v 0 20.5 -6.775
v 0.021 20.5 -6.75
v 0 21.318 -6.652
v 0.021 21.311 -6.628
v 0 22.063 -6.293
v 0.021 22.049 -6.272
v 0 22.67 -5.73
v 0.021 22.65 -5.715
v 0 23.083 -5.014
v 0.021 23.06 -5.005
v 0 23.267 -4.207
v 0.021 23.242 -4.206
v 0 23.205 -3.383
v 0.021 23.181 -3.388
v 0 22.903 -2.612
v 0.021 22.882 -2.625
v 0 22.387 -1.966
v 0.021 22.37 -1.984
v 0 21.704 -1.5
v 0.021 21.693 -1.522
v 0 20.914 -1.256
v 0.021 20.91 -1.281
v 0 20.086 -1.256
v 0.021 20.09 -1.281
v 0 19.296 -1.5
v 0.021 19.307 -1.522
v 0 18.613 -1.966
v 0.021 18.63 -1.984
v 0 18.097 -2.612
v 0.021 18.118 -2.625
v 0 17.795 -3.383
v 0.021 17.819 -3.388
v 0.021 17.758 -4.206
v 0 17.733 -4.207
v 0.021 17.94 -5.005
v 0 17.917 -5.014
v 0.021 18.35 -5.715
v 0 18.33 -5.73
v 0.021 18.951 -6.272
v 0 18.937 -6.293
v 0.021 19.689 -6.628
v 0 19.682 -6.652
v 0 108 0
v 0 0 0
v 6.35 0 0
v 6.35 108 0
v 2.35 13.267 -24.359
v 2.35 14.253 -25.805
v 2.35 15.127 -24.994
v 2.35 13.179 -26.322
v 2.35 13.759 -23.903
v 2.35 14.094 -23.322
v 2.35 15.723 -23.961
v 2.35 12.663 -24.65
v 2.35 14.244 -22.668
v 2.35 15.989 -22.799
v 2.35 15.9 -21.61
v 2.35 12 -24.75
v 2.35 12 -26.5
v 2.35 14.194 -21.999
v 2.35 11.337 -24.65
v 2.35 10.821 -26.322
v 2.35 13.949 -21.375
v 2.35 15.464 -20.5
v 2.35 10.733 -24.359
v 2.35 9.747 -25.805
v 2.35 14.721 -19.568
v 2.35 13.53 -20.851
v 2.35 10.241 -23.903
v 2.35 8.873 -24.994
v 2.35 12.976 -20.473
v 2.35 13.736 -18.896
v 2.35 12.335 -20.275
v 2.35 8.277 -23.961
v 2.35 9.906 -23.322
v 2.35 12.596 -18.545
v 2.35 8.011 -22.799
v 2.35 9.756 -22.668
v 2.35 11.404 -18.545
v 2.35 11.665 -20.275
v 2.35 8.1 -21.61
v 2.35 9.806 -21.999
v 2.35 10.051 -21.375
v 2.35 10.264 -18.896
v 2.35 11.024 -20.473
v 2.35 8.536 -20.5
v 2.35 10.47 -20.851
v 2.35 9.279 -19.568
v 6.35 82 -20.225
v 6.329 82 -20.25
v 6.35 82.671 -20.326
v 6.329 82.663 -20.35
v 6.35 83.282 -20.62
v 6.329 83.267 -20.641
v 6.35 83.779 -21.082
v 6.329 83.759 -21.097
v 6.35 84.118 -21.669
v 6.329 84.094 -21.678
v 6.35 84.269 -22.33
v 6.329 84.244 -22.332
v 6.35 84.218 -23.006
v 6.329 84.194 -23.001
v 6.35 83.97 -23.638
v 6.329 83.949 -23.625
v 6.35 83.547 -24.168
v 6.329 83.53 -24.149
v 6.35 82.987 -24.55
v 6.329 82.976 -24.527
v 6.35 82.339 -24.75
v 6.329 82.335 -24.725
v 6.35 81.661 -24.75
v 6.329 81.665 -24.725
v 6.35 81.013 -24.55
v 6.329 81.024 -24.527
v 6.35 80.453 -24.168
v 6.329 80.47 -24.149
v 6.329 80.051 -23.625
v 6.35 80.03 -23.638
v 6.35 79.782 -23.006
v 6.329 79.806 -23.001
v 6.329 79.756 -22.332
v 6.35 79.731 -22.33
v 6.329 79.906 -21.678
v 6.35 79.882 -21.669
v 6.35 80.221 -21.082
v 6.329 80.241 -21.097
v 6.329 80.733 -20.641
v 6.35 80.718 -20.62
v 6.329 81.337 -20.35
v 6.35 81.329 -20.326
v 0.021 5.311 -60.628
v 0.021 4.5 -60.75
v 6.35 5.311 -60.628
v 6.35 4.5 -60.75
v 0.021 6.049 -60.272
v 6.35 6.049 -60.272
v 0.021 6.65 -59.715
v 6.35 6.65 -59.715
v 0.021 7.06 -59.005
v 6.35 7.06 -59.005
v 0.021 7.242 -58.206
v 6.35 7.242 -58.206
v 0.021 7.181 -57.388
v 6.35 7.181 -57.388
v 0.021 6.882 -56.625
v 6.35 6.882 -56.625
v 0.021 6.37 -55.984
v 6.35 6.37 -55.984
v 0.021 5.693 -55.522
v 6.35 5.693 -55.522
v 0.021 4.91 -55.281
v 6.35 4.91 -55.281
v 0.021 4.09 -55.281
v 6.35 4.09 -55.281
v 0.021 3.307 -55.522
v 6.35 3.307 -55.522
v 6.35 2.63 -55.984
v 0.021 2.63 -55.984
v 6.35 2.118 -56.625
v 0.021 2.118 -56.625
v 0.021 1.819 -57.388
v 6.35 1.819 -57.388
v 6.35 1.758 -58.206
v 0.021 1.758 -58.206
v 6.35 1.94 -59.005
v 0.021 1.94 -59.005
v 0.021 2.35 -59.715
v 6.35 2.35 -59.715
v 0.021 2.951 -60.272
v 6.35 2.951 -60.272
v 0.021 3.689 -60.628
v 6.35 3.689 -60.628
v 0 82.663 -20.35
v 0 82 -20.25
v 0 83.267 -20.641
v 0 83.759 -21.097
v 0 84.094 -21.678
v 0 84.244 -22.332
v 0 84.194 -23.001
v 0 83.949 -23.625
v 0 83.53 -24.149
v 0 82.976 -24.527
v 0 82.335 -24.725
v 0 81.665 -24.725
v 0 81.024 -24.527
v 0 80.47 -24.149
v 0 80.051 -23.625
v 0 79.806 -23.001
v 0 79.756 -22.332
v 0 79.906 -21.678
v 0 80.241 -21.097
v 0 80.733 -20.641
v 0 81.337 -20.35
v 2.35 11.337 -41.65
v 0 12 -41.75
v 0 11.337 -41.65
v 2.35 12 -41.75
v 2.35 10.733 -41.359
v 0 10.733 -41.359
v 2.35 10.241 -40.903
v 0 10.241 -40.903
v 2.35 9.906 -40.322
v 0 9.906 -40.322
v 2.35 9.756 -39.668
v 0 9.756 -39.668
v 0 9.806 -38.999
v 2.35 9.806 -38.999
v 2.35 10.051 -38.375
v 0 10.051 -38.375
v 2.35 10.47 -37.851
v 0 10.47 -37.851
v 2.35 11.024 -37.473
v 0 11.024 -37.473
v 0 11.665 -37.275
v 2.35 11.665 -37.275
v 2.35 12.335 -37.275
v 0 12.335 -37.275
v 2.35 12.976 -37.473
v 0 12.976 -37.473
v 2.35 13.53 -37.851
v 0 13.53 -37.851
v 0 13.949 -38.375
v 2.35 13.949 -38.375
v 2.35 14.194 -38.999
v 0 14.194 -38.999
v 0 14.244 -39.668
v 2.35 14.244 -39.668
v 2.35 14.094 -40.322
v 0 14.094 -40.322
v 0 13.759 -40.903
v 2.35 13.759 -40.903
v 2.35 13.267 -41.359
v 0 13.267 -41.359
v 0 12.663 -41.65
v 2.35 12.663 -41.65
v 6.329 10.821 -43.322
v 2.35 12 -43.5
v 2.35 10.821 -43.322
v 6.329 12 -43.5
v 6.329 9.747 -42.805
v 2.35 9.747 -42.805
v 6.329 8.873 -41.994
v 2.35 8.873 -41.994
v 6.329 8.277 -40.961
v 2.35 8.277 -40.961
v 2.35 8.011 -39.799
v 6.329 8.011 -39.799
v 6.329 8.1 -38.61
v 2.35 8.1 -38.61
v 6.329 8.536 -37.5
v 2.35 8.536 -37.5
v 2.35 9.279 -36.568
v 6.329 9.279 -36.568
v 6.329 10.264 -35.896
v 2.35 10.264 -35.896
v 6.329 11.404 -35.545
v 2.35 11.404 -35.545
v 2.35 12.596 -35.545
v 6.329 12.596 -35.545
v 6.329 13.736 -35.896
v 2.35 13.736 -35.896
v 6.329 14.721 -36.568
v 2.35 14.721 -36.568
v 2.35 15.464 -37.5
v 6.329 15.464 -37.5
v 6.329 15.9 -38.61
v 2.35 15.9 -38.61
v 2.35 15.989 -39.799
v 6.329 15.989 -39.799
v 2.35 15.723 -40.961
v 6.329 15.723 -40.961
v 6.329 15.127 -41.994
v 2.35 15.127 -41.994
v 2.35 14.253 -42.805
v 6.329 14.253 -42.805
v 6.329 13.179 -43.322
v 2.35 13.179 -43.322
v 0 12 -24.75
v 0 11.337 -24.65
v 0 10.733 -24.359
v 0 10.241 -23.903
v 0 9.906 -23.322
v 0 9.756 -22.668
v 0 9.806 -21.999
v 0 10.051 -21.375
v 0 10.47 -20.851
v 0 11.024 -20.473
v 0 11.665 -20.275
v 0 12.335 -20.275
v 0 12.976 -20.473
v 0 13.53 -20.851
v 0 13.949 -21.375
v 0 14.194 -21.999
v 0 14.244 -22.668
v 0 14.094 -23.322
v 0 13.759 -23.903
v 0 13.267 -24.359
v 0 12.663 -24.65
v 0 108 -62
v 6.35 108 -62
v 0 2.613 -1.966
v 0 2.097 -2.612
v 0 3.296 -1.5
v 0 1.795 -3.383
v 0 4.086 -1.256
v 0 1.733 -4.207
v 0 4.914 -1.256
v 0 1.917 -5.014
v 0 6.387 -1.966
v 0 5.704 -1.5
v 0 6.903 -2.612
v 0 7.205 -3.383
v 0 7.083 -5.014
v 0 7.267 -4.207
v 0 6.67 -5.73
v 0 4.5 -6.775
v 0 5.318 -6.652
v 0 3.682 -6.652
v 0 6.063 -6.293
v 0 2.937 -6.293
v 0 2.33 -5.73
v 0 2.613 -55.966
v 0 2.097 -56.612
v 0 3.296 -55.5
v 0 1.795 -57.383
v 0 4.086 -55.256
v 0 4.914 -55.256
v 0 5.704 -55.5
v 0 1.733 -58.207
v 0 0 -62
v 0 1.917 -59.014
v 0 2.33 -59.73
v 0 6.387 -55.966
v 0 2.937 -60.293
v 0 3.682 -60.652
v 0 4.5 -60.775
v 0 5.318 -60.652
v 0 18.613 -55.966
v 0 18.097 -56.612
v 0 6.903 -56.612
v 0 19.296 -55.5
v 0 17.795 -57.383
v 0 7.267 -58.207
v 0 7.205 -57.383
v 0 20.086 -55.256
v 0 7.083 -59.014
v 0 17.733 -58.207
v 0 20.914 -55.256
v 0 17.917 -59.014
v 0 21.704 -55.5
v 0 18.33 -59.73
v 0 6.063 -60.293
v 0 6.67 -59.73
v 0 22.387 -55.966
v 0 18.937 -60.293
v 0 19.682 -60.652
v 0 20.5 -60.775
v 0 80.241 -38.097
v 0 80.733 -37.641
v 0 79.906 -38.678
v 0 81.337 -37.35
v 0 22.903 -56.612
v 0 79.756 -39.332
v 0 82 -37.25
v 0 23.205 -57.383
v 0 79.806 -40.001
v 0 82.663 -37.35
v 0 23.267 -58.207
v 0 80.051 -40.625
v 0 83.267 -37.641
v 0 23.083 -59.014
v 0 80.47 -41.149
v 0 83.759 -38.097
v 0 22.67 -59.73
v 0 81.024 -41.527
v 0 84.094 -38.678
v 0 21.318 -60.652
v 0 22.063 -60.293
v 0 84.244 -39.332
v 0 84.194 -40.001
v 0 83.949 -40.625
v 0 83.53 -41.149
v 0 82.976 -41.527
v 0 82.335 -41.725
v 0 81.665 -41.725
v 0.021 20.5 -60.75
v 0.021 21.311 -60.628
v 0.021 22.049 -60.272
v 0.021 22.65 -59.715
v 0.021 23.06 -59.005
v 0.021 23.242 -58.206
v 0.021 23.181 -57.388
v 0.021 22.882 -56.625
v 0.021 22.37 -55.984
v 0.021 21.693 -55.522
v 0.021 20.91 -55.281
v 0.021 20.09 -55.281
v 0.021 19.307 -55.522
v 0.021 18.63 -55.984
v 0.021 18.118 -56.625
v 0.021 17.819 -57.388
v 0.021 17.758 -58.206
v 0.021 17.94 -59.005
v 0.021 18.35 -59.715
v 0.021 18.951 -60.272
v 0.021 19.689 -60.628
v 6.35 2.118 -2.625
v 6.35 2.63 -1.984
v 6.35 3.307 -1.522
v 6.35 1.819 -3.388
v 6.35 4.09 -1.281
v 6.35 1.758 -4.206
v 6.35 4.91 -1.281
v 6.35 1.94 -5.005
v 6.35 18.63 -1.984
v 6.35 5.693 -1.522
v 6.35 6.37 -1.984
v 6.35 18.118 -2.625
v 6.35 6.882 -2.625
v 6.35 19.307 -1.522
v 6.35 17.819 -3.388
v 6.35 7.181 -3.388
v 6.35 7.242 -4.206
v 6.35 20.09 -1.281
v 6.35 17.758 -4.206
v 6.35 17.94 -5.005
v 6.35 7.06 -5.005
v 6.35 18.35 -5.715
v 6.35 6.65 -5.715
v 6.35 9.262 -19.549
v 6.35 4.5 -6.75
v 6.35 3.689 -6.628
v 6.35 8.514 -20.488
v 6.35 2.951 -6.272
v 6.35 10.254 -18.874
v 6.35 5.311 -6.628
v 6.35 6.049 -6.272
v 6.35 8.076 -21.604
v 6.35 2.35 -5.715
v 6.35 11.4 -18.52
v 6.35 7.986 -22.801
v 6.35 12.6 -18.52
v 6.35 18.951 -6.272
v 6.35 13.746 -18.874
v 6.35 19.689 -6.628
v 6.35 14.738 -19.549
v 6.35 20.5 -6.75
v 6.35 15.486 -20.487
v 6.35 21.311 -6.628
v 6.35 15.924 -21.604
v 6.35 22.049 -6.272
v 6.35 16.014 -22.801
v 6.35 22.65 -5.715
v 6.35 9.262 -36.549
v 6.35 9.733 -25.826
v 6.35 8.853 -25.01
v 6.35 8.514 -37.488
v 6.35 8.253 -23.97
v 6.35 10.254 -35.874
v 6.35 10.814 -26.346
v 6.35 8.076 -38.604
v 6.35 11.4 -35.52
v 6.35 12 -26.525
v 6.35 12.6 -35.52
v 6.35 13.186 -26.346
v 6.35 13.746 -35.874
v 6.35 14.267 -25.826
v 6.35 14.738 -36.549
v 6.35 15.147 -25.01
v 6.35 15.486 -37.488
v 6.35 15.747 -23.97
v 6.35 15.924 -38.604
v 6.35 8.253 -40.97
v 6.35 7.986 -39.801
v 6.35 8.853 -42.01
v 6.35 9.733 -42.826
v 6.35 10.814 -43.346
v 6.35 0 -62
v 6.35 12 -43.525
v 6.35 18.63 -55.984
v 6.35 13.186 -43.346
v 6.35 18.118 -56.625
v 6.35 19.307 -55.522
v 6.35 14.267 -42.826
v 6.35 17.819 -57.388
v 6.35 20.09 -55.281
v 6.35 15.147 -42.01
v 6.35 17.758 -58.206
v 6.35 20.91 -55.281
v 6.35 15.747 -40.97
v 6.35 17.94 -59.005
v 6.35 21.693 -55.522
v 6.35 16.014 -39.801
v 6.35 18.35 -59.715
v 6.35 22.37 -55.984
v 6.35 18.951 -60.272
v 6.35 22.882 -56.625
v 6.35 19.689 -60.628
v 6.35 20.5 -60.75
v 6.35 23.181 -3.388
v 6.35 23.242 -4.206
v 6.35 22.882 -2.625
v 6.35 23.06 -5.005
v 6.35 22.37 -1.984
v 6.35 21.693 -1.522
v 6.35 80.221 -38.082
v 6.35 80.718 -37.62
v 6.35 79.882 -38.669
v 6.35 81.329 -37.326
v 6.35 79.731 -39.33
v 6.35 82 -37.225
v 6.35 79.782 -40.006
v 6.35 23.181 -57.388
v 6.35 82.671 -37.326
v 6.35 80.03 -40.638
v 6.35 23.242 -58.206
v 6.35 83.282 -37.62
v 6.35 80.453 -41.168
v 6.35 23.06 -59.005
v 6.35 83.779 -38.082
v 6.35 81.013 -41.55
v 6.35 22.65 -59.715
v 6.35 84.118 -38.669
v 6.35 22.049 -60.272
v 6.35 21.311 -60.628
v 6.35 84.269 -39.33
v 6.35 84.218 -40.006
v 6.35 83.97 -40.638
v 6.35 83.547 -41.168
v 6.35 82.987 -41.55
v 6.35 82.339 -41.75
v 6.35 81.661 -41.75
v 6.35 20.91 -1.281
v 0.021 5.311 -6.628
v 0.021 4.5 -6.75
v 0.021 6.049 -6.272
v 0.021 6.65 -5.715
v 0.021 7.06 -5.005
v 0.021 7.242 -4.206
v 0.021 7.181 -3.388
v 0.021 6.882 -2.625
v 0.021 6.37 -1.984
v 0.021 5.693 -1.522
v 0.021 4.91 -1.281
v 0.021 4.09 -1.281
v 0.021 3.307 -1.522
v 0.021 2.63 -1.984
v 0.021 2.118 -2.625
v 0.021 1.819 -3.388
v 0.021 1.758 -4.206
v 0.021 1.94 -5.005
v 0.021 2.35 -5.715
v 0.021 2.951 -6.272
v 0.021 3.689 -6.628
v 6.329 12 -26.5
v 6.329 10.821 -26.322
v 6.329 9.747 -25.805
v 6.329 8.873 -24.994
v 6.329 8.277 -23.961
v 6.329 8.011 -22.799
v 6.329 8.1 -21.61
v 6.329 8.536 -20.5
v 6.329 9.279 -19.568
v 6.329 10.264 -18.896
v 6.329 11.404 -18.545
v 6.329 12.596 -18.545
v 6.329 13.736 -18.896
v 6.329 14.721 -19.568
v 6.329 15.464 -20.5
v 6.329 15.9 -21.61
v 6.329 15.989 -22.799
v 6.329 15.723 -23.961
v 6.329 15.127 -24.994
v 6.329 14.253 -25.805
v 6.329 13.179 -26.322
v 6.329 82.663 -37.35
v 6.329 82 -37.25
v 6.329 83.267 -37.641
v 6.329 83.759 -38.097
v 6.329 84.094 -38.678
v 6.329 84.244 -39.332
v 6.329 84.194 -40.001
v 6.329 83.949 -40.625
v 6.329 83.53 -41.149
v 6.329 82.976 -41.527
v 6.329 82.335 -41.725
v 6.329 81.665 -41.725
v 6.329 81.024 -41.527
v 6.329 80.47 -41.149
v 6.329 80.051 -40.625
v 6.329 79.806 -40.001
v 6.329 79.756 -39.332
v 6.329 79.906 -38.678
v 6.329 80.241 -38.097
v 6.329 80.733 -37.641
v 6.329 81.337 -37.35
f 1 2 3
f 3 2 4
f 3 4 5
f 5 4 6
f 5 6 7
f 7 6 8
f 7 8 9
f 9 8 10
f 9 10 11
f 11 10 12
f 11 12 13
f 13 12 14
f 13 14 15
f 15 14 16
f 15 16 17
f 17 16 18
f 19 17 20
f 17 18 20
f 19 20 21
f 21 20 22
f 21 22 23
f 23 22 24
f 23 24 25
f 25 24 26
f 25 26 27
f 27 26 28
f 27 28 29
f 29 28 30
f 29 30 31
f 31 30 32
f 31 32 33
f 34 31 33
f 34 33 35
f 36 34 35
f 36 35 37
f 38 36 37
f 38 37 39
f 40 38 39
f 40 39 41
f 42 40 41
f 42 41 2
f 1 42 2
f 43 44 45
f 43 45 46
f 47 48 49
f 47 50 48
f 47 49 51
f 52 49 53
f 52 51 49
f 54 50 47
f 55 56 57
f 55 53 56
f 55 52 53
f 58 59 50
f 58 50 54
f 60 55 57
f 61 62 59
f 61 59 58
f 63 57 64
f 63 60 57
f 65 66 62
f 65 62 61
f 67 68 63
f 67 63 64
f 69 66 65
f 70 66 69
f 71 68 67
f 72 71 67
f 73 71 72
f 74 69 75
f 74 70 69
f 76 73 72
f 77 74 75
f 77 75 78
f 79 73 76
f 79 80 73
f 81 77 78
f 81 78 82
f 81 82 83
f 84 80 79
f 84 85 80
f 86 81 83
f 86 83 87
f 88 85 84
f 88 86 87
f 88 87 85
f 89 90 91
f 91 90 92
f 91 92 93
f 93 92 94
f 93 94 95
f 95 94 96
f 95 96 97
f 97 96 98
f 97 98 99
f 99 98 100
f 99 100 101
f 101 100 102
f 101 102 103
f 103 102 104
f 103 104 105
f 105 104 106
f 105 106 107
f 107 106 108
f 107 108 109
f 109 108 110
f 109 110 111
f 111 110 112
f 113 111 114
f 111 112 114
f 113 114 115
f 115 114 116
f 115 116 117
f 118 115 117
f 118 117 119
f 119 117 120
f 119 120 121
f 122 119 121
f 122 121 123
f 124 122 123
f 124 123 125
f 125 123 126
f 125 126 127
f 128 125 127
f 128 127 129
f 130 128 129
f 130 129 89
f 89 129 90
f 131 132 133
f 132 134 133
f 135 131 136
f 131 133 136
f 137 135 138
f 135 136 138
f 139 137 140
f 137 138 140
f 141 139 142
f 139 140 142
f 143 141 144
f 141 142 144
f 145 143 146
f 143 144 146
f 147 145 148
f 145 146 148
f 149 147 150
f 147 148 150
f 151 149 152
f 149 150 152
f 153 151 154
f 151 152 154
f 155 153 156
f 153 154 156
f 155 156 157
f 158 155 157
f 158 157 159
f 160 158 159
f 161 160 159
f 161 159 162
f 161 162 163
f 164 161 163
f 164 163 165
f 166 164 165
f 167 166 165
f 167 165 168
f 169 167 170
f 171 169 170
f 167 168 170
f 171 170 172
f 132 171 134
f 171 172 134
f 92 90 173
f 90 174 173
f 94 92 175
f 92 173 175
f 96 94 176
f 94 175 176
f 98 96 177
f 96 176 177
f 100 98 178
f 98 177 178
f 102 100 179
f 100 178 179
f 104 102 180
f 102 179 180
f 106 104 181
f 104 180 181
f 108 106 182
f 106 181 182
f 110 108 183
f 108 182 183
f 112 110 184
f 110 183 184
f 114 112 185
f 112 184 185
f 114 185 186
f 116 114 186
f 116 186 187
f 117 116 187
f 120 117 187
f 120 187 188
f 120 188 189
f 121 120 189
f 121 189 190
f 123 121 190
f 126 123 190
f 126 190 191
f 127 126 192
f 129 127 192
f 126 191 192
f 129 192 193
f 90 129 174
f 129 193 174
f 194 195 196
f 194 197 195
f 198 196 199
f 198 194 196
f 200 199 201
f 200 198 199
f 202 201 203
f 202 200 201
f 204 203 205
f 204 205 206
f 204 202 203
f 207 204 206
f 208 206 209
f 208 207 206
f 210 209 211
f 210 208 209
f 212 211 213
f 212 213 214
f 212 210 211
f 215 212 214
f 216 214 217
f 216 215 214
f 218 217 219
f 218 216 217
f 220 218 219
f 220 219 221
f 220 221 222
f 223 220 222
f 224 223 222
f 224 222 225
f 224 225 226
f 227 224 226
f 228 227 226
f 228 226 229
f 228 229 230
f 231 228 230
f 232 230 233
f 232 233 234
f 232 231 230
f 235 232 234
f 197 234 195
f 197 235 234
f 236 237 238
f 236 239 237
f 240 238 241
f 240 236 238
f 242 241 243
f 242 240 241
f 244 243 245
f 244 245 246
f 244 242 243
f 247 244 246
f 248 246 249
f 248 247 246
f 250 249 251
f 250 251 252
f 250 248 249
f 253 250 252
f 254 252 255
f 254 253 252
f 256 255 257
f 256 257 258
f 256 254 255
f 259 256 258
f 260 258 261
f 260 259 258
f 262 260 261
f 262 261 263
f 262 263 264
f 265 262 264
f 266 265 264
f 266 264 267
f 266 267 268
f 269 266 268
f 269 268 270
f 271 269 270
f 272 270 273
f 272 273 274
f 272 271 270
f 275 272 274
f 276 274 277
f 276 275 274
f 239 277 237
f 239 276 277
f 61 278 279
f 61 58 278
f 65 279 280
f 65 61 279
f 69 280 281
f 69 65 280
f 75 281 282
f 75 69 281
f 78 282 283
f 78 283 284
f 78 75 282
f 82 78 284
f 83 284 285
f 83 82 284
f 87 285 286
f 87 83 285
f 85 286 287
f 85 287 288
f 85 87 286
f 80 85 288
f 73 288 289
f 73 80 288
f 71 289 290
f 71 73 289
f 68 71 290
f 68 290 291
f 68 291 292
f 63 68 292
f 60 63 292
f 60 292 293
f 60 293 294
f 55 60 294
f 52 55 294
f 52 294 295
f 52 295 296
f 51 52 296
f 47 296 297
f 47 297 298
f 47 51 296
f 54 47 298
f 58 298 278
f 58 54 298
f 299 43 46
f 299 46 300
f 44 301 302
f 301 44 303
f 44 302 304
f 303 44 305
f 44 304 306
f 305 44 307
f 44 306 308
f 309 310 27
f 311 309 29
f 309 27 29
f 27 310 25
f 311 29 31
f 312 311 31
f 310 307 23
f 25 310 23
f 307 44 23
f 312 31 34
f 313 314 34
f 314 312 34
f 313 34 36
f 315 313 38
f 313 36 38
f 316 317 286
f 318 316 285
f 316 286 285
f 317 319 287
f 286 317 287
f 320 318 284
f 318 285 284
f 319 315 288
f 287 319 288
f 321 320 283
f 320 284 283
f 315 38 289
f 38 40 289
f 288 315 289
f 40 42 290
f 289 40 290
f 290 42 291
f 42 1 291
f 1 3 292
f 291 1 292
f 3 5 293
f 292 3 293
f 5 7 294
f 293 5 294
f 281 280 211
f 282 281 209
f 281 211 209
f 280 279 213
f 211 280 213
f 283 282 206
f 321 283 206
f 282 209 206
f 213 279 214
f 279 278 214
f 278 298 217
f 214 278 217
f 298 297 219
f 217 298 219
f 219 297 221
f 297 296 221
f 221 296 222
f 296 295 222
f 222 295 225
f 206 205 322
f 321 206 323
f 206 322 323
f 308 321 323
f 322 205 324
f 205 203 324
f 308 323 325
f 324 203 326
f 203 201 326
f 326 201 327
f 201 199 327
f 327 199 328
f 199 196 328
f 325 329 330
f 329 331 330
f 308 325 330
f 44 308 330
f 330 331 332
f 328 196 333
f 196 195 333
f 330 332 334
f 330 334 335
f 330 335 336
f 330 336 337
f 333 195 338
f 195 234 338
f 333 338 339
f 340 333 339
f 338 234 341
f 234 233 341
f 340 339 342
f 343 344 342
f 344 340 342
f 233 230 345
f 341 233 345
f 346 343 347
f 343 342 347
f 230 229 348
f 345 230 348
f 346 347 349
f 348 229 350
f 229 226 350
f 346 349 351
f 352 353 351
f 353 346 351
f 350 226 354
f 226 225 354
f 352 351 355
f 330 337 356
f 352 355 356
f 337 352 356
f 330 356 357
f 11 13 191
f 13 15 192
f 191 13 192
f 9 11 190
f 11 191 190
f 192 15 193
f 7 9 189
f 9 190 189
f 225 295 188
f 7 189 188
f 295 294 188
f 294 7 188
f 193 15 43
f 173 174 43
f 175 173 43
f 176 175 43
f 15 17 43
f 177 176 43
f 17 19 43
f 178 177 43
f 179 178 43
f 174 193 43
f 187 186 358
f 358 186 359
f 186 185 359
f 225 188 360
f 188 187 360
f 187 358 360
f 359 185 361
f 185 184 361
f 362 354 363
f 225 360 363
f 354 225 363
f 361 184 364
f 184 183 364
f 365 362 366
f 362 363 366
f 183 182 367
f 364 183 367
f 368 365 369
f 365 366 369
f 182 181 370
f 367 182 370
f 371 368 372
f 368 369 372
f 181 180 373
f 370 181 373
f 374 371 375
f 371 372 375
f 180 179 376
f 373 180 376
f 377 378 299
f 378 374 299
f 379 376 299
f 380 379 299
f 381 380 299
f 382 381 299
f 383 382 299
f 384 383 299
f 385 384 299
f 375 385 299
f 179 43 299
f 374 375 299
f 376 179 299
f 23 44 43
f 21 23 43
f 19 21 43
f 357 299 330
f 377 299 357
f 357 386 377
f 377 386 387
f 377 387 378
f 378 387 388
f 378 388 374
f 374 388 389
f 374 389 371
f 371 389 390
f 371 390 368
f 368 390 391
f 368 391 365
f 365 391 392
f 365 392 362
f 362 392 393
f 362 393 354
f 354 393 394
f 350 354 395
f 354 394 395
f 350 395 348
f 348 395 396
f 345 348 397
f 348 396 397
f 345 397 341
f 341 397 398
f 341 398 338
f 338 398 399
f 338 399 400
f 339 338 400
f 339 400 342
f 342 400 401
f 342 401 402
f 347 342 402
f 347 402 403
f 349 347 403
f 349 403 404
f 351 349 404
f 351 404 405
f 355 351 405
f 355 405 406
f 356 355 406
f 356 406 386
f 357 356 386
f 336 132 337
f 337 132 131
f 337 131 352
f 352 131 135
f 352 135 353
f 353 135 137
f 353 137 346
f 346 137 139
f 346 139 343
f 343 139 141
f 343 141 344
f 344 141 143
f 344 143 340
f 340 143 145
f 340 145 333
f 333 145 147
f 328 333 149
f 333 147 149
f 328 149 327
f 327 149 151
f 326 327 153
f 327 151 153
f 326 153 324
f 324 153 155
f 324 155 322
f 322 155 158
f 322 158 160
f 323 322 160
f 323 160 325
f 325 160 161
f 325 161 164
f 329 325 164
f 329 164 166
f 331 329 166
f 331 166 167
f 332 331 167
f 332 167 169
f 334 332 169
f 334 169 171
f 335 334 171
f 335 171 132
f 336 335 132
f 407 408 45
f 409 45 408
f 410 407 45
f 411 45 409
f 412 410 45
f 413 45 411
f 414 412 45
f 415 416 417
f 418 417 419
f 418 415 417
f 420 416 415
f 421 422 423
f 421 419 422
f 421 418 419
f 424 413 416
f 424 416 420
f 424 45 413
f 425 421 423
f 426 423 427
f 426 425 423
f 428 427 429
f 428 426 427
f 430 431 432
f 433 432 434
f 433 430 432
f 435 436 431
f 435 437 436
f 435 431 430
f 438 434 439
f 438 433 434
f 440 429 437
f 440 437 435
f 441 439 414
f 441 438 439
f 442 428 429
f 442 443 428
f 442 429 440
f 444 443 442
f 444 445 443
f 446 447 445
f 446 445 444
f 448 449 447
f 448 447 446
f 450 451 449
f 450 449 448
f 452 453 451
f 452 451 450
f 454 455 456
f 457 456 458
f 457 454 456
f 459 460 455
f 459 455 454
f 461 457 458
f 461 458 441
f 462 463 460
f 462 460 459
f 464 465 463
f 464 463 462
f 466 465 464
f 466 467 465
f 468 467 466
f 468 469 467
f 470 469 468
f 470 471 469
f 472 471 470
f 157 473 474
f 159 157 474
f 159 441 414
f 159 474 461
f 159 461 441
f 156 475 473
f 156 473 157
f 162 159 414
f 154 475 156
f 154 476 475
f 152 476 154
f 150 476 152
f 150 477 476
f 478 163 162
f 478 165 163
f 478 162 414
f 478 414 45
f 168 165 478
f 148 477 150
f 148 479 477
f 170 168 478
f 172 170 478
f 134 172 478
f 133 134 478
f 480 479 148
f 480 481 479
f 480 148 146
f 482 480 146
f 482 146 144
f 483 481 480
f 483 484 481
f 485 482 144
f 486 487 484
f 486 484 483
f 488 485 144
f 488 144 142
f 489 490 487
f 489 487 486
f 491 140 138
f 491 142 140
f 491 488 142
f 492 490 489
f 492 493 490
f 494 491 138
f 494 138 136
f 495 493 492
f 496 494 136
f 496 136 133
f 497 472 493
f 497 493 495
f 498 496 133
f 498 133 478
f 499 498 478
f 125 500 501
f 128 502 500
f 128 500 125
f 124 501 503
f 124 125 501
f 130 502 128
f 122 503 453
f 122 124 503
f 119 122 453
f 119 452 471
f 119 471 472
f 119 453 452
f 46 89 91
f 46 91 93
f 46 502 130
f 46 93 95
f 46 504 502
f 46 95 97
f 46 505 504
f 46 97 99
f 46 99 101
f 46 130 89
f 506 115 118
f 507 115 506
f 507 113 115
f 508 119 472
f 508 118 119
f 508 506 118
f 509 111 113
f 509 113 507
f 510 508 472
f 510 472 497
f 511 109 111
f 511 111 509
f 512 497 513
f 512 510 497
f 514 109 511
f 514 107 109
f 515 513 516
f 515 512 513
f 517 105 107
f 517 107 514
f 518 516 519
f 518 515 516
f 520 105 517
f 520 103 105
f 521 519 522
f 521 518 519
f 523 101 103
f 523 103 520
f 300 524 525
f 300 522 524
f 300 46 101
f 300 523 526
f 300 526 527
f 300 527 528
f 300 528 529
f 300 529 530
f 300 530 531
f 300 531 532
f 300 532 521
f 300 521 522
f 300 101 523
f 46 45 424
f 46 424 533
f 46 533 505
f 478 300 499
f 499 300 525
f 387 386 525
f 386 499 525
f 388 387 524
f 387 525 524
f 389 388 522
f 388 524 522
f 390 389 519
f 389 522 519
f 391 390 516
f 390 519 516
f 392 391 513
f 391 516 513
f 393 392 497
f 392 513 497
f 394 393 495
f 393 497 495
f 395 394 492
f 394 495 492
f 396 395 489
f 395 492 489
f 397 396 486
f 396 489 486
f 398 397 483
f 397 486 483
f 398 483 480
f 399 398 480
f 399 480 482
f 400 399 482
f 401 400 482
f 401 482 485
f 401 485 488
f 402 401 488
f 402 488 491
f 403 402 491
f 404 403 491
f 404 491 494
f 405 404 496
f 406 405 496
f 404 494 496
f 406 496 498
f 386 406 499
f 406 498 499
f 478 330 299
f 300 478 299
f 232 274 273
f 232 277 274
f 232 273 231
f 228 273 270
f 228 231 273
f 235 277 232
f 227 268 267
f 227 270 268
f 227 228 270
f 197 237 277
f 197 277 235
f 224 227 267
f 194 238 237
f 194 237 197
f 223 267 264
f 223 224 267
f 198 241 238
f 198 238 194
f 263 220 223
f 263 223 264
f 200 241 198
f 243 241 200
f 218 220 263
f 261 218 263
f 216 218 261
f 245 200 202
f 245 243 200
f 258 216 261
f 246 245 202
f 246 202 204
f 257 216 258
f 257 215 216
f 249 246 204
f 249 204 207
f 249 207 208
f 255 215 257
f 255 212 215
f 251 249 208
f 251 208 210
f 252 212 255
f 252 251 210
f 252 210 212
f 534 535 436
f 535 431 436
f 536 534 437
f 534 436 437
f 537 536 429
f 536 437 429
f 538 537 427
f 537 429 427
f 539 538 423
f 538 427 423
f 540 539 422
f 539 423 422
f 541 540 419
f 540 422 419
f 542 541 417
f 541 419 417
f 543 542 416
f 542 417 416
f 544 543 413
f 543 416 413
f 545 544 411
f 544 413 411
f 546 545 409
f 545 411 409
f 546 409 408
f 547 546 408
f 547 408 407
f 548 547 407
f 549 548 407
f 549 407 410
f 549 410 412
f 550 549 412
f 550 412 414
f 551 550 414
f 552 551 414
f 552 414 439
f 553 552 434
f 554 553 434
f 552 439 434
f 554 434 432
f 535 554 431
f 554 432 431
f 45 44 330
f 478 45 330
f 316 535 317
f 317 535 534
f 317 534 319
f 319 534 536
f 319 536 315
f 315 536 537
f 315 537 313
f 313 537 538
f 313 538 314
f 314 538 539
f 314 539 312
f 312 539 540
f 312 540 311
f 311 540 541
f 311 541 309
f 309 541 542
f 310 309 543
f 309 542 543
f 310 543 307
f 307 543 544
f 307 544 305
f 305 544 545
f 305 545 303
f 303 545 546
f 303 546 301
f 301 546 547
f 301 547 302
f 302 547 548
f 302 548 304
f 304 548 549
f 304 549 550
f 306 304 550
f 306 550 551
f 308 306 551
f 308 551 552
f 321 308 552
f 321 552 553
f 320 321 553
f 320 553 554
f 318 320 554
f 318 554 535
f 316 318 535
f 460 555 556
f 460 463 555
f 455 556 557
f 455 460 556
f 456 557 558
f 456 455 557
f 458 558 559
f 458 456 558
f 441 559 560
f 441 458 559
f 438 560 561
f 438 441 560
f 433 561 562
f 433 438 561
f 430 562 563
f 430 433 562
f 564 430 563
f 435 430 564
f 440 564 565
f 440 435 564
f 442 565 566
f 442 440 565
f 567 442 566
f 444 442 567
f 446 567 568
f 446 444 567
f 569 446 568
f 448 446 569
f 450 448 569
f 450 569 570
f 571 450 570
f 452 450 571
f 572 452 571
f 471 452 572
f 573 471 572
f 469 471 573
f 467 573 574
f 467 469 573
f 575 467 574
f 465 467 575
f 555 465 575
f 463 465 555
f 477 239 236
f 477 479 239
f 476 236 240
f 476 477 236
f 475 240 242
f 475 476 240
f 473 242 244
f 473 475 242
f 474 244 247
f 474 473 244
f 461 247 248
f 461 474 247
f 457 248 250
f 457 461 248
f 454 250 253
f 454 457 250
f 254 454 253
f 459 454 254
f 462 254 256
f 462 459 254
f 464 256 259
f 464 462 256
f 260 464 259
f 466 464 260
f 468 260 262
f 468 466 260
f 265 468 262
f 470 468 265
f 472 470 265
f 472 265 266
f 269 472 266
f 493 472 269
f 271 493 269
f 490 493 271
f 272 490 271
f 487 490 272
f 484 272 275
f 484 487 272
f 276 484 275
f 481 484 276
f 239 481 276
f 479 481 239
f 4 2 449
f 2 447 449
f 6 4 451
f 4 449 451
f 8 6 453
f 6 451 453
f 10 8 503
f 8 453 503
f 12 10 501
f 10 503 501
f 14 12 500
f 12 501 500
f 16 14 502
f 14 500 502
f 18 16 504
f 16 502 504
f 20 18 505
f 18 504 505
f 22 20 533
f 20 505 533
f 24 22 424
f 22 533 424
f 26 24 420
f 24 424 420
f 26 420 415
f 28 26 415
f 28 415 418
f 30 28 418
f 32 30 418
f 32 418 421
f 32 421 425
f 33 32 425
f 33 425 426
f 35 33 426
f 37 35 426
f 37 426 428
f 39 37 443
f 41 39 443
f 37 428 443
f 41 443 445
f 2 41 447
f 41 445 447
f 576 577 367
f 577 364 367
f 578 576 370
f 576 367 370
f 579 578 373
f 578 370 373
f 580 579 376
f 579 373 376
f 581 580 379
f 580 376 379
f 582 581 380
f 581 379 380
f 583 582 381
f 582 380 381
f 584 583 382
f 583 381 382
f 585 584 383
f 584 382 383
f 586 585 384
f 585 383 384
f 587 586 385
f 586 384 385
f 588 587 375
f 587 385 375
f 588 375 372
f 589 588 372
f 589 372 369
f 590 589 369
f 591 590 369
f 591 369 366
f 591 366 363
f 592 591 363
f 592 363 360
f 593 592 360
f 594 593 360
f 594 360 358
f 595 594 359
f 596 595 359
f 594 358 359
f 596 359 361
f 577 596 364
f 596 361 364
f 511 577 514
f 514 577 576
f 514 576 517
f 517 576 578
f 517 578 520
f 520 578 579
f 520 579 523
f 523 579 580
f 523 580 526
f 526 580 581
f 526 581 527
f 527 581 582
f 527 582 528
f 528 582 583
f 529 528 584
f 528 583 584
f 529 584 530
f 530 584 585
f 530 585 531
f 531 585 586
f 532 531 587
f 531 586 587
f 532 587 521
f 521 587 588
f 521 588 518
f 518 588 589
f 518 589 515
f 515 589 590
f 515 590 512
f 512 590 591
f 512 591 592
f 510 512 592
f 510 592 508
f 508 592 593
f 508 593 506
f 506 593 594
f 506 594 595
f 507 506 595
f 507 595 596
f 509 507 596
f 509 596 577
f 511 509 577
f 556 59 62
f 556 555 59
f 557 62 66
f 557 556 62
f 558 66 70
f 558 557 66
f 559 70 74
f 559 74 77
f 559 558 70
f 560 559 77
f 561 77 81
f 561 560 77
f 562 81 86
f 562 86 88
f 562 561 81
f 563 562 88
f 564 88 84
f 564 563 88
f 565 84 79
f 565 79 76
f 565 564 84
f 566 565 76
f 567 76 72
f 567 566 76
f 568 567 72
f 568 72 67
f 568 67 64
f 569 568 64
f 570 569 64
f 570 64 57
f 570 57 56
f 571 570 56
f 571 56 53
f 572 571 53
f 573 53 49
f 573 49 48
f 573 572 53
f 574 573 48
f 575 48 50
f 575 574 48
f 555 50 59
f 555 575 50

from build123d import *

# Parameters (mm, degrees)
SKETCH1_W                      = 62
SKETCH1_H                      = 108
BOSS_EXTRUDE1_DEPTH            = 6.35
M5_CLEARANCE_HOLE1_D           = 5.5
M5_CLEARANCE_HOLE1_CSINK_D     = 5.55
M5_CLEARANCE_HOLE1_CSINK_ANGLE = 100
M4_CLEARANCE_HOLE1_D           = 4.5
M4_CLEARANCE_HOLE1_CSINK_D     = 4.55
M4_CLEARANCE_HOLE1_CSINK_ANGLE = 100
CBORE_FOR_M4_SHCS1_AT_2_COUNT  = 2
CBORE_FOR_M4_SHCS1_AT_2_PITCH  = 17


with BuildPart() as part:
    # Sketch1 → Boss-Extrude1 (new body)
    with BuildSketch(Plane(origin=(0, 0, 0), x_dir=(0, 0, -1), z_dir=(1, 0, 0))):
        with Locations((31, 54)):
            Rectangle(SKETCH1_W, SKETCH1_H)
    extrude(amount=BOSS_EXTRUDE1_DEPTH)

    # M5 Clearance Hole1 (through all)
    with Locations(Plane.ZY):
        with Locations((-4, 20.5), (-4, 4.5), (-58, 4.5), (-58, 20.5)):
            CounterSinkHole(M5_CLEARANCE_HOLE1_D / 2, M5_CLEARANCE_HOLE1_CSINK_D / 2, counter_sink_angle=M5_CLEARANCE_HOLE1_CSINK_ANGLE)

    # M4 Clearance Hole1 (through all)
    with Locations(Plane(origin=(6.35, 0, 0), x_dir=(0, 0, -1), z_dir=(1, 0, 0))):
        with Locations((39.5, 82), (22.5, 82)):
            CounterSinkHole(M4_CLEARANCE_HOLE1_D / 2, M4_CLEARANCE_HOLE1_CSINK_D / 2, counter_sink_angle=M4_CLEARANCE_HOLE1_CSINK_ANGLE)

    # Sketch7 → CBORE for M4 SHCS1 (revolve, cut)
    with BuildSketch(Plane(origin=(6.35, 12, -22.5), x_dir=(0, 0, -1), z_dir=(0, 1, 0))):
        Polygon((0, 0), (0, 6.35), (2.25, 6.35), (2.25, 4), (4, 4), (4, 0.020977491), (4.025, 0), align=None)
    cbore_for_m4_shcs1 = revolve(axis=Axis((12.7, 12, -22.5), (-1, 0, 0)), mode=Mode.SUBTRACT)

    # CBORE for M4 SHCS1 at 2: CBORE for M4 SHCS1 ×2
    with Locations(*[(0, 0, -i * CBORE_FOR_M4_SHCS1_AT_2_PITCH) for i in range(1, CBORE_FOR_M4_SHCS1_AT_2_COUNT)]):
        add(cbore_for_m4_shcs1, mode=Mode.SUBTRACT)


solid = part.part
